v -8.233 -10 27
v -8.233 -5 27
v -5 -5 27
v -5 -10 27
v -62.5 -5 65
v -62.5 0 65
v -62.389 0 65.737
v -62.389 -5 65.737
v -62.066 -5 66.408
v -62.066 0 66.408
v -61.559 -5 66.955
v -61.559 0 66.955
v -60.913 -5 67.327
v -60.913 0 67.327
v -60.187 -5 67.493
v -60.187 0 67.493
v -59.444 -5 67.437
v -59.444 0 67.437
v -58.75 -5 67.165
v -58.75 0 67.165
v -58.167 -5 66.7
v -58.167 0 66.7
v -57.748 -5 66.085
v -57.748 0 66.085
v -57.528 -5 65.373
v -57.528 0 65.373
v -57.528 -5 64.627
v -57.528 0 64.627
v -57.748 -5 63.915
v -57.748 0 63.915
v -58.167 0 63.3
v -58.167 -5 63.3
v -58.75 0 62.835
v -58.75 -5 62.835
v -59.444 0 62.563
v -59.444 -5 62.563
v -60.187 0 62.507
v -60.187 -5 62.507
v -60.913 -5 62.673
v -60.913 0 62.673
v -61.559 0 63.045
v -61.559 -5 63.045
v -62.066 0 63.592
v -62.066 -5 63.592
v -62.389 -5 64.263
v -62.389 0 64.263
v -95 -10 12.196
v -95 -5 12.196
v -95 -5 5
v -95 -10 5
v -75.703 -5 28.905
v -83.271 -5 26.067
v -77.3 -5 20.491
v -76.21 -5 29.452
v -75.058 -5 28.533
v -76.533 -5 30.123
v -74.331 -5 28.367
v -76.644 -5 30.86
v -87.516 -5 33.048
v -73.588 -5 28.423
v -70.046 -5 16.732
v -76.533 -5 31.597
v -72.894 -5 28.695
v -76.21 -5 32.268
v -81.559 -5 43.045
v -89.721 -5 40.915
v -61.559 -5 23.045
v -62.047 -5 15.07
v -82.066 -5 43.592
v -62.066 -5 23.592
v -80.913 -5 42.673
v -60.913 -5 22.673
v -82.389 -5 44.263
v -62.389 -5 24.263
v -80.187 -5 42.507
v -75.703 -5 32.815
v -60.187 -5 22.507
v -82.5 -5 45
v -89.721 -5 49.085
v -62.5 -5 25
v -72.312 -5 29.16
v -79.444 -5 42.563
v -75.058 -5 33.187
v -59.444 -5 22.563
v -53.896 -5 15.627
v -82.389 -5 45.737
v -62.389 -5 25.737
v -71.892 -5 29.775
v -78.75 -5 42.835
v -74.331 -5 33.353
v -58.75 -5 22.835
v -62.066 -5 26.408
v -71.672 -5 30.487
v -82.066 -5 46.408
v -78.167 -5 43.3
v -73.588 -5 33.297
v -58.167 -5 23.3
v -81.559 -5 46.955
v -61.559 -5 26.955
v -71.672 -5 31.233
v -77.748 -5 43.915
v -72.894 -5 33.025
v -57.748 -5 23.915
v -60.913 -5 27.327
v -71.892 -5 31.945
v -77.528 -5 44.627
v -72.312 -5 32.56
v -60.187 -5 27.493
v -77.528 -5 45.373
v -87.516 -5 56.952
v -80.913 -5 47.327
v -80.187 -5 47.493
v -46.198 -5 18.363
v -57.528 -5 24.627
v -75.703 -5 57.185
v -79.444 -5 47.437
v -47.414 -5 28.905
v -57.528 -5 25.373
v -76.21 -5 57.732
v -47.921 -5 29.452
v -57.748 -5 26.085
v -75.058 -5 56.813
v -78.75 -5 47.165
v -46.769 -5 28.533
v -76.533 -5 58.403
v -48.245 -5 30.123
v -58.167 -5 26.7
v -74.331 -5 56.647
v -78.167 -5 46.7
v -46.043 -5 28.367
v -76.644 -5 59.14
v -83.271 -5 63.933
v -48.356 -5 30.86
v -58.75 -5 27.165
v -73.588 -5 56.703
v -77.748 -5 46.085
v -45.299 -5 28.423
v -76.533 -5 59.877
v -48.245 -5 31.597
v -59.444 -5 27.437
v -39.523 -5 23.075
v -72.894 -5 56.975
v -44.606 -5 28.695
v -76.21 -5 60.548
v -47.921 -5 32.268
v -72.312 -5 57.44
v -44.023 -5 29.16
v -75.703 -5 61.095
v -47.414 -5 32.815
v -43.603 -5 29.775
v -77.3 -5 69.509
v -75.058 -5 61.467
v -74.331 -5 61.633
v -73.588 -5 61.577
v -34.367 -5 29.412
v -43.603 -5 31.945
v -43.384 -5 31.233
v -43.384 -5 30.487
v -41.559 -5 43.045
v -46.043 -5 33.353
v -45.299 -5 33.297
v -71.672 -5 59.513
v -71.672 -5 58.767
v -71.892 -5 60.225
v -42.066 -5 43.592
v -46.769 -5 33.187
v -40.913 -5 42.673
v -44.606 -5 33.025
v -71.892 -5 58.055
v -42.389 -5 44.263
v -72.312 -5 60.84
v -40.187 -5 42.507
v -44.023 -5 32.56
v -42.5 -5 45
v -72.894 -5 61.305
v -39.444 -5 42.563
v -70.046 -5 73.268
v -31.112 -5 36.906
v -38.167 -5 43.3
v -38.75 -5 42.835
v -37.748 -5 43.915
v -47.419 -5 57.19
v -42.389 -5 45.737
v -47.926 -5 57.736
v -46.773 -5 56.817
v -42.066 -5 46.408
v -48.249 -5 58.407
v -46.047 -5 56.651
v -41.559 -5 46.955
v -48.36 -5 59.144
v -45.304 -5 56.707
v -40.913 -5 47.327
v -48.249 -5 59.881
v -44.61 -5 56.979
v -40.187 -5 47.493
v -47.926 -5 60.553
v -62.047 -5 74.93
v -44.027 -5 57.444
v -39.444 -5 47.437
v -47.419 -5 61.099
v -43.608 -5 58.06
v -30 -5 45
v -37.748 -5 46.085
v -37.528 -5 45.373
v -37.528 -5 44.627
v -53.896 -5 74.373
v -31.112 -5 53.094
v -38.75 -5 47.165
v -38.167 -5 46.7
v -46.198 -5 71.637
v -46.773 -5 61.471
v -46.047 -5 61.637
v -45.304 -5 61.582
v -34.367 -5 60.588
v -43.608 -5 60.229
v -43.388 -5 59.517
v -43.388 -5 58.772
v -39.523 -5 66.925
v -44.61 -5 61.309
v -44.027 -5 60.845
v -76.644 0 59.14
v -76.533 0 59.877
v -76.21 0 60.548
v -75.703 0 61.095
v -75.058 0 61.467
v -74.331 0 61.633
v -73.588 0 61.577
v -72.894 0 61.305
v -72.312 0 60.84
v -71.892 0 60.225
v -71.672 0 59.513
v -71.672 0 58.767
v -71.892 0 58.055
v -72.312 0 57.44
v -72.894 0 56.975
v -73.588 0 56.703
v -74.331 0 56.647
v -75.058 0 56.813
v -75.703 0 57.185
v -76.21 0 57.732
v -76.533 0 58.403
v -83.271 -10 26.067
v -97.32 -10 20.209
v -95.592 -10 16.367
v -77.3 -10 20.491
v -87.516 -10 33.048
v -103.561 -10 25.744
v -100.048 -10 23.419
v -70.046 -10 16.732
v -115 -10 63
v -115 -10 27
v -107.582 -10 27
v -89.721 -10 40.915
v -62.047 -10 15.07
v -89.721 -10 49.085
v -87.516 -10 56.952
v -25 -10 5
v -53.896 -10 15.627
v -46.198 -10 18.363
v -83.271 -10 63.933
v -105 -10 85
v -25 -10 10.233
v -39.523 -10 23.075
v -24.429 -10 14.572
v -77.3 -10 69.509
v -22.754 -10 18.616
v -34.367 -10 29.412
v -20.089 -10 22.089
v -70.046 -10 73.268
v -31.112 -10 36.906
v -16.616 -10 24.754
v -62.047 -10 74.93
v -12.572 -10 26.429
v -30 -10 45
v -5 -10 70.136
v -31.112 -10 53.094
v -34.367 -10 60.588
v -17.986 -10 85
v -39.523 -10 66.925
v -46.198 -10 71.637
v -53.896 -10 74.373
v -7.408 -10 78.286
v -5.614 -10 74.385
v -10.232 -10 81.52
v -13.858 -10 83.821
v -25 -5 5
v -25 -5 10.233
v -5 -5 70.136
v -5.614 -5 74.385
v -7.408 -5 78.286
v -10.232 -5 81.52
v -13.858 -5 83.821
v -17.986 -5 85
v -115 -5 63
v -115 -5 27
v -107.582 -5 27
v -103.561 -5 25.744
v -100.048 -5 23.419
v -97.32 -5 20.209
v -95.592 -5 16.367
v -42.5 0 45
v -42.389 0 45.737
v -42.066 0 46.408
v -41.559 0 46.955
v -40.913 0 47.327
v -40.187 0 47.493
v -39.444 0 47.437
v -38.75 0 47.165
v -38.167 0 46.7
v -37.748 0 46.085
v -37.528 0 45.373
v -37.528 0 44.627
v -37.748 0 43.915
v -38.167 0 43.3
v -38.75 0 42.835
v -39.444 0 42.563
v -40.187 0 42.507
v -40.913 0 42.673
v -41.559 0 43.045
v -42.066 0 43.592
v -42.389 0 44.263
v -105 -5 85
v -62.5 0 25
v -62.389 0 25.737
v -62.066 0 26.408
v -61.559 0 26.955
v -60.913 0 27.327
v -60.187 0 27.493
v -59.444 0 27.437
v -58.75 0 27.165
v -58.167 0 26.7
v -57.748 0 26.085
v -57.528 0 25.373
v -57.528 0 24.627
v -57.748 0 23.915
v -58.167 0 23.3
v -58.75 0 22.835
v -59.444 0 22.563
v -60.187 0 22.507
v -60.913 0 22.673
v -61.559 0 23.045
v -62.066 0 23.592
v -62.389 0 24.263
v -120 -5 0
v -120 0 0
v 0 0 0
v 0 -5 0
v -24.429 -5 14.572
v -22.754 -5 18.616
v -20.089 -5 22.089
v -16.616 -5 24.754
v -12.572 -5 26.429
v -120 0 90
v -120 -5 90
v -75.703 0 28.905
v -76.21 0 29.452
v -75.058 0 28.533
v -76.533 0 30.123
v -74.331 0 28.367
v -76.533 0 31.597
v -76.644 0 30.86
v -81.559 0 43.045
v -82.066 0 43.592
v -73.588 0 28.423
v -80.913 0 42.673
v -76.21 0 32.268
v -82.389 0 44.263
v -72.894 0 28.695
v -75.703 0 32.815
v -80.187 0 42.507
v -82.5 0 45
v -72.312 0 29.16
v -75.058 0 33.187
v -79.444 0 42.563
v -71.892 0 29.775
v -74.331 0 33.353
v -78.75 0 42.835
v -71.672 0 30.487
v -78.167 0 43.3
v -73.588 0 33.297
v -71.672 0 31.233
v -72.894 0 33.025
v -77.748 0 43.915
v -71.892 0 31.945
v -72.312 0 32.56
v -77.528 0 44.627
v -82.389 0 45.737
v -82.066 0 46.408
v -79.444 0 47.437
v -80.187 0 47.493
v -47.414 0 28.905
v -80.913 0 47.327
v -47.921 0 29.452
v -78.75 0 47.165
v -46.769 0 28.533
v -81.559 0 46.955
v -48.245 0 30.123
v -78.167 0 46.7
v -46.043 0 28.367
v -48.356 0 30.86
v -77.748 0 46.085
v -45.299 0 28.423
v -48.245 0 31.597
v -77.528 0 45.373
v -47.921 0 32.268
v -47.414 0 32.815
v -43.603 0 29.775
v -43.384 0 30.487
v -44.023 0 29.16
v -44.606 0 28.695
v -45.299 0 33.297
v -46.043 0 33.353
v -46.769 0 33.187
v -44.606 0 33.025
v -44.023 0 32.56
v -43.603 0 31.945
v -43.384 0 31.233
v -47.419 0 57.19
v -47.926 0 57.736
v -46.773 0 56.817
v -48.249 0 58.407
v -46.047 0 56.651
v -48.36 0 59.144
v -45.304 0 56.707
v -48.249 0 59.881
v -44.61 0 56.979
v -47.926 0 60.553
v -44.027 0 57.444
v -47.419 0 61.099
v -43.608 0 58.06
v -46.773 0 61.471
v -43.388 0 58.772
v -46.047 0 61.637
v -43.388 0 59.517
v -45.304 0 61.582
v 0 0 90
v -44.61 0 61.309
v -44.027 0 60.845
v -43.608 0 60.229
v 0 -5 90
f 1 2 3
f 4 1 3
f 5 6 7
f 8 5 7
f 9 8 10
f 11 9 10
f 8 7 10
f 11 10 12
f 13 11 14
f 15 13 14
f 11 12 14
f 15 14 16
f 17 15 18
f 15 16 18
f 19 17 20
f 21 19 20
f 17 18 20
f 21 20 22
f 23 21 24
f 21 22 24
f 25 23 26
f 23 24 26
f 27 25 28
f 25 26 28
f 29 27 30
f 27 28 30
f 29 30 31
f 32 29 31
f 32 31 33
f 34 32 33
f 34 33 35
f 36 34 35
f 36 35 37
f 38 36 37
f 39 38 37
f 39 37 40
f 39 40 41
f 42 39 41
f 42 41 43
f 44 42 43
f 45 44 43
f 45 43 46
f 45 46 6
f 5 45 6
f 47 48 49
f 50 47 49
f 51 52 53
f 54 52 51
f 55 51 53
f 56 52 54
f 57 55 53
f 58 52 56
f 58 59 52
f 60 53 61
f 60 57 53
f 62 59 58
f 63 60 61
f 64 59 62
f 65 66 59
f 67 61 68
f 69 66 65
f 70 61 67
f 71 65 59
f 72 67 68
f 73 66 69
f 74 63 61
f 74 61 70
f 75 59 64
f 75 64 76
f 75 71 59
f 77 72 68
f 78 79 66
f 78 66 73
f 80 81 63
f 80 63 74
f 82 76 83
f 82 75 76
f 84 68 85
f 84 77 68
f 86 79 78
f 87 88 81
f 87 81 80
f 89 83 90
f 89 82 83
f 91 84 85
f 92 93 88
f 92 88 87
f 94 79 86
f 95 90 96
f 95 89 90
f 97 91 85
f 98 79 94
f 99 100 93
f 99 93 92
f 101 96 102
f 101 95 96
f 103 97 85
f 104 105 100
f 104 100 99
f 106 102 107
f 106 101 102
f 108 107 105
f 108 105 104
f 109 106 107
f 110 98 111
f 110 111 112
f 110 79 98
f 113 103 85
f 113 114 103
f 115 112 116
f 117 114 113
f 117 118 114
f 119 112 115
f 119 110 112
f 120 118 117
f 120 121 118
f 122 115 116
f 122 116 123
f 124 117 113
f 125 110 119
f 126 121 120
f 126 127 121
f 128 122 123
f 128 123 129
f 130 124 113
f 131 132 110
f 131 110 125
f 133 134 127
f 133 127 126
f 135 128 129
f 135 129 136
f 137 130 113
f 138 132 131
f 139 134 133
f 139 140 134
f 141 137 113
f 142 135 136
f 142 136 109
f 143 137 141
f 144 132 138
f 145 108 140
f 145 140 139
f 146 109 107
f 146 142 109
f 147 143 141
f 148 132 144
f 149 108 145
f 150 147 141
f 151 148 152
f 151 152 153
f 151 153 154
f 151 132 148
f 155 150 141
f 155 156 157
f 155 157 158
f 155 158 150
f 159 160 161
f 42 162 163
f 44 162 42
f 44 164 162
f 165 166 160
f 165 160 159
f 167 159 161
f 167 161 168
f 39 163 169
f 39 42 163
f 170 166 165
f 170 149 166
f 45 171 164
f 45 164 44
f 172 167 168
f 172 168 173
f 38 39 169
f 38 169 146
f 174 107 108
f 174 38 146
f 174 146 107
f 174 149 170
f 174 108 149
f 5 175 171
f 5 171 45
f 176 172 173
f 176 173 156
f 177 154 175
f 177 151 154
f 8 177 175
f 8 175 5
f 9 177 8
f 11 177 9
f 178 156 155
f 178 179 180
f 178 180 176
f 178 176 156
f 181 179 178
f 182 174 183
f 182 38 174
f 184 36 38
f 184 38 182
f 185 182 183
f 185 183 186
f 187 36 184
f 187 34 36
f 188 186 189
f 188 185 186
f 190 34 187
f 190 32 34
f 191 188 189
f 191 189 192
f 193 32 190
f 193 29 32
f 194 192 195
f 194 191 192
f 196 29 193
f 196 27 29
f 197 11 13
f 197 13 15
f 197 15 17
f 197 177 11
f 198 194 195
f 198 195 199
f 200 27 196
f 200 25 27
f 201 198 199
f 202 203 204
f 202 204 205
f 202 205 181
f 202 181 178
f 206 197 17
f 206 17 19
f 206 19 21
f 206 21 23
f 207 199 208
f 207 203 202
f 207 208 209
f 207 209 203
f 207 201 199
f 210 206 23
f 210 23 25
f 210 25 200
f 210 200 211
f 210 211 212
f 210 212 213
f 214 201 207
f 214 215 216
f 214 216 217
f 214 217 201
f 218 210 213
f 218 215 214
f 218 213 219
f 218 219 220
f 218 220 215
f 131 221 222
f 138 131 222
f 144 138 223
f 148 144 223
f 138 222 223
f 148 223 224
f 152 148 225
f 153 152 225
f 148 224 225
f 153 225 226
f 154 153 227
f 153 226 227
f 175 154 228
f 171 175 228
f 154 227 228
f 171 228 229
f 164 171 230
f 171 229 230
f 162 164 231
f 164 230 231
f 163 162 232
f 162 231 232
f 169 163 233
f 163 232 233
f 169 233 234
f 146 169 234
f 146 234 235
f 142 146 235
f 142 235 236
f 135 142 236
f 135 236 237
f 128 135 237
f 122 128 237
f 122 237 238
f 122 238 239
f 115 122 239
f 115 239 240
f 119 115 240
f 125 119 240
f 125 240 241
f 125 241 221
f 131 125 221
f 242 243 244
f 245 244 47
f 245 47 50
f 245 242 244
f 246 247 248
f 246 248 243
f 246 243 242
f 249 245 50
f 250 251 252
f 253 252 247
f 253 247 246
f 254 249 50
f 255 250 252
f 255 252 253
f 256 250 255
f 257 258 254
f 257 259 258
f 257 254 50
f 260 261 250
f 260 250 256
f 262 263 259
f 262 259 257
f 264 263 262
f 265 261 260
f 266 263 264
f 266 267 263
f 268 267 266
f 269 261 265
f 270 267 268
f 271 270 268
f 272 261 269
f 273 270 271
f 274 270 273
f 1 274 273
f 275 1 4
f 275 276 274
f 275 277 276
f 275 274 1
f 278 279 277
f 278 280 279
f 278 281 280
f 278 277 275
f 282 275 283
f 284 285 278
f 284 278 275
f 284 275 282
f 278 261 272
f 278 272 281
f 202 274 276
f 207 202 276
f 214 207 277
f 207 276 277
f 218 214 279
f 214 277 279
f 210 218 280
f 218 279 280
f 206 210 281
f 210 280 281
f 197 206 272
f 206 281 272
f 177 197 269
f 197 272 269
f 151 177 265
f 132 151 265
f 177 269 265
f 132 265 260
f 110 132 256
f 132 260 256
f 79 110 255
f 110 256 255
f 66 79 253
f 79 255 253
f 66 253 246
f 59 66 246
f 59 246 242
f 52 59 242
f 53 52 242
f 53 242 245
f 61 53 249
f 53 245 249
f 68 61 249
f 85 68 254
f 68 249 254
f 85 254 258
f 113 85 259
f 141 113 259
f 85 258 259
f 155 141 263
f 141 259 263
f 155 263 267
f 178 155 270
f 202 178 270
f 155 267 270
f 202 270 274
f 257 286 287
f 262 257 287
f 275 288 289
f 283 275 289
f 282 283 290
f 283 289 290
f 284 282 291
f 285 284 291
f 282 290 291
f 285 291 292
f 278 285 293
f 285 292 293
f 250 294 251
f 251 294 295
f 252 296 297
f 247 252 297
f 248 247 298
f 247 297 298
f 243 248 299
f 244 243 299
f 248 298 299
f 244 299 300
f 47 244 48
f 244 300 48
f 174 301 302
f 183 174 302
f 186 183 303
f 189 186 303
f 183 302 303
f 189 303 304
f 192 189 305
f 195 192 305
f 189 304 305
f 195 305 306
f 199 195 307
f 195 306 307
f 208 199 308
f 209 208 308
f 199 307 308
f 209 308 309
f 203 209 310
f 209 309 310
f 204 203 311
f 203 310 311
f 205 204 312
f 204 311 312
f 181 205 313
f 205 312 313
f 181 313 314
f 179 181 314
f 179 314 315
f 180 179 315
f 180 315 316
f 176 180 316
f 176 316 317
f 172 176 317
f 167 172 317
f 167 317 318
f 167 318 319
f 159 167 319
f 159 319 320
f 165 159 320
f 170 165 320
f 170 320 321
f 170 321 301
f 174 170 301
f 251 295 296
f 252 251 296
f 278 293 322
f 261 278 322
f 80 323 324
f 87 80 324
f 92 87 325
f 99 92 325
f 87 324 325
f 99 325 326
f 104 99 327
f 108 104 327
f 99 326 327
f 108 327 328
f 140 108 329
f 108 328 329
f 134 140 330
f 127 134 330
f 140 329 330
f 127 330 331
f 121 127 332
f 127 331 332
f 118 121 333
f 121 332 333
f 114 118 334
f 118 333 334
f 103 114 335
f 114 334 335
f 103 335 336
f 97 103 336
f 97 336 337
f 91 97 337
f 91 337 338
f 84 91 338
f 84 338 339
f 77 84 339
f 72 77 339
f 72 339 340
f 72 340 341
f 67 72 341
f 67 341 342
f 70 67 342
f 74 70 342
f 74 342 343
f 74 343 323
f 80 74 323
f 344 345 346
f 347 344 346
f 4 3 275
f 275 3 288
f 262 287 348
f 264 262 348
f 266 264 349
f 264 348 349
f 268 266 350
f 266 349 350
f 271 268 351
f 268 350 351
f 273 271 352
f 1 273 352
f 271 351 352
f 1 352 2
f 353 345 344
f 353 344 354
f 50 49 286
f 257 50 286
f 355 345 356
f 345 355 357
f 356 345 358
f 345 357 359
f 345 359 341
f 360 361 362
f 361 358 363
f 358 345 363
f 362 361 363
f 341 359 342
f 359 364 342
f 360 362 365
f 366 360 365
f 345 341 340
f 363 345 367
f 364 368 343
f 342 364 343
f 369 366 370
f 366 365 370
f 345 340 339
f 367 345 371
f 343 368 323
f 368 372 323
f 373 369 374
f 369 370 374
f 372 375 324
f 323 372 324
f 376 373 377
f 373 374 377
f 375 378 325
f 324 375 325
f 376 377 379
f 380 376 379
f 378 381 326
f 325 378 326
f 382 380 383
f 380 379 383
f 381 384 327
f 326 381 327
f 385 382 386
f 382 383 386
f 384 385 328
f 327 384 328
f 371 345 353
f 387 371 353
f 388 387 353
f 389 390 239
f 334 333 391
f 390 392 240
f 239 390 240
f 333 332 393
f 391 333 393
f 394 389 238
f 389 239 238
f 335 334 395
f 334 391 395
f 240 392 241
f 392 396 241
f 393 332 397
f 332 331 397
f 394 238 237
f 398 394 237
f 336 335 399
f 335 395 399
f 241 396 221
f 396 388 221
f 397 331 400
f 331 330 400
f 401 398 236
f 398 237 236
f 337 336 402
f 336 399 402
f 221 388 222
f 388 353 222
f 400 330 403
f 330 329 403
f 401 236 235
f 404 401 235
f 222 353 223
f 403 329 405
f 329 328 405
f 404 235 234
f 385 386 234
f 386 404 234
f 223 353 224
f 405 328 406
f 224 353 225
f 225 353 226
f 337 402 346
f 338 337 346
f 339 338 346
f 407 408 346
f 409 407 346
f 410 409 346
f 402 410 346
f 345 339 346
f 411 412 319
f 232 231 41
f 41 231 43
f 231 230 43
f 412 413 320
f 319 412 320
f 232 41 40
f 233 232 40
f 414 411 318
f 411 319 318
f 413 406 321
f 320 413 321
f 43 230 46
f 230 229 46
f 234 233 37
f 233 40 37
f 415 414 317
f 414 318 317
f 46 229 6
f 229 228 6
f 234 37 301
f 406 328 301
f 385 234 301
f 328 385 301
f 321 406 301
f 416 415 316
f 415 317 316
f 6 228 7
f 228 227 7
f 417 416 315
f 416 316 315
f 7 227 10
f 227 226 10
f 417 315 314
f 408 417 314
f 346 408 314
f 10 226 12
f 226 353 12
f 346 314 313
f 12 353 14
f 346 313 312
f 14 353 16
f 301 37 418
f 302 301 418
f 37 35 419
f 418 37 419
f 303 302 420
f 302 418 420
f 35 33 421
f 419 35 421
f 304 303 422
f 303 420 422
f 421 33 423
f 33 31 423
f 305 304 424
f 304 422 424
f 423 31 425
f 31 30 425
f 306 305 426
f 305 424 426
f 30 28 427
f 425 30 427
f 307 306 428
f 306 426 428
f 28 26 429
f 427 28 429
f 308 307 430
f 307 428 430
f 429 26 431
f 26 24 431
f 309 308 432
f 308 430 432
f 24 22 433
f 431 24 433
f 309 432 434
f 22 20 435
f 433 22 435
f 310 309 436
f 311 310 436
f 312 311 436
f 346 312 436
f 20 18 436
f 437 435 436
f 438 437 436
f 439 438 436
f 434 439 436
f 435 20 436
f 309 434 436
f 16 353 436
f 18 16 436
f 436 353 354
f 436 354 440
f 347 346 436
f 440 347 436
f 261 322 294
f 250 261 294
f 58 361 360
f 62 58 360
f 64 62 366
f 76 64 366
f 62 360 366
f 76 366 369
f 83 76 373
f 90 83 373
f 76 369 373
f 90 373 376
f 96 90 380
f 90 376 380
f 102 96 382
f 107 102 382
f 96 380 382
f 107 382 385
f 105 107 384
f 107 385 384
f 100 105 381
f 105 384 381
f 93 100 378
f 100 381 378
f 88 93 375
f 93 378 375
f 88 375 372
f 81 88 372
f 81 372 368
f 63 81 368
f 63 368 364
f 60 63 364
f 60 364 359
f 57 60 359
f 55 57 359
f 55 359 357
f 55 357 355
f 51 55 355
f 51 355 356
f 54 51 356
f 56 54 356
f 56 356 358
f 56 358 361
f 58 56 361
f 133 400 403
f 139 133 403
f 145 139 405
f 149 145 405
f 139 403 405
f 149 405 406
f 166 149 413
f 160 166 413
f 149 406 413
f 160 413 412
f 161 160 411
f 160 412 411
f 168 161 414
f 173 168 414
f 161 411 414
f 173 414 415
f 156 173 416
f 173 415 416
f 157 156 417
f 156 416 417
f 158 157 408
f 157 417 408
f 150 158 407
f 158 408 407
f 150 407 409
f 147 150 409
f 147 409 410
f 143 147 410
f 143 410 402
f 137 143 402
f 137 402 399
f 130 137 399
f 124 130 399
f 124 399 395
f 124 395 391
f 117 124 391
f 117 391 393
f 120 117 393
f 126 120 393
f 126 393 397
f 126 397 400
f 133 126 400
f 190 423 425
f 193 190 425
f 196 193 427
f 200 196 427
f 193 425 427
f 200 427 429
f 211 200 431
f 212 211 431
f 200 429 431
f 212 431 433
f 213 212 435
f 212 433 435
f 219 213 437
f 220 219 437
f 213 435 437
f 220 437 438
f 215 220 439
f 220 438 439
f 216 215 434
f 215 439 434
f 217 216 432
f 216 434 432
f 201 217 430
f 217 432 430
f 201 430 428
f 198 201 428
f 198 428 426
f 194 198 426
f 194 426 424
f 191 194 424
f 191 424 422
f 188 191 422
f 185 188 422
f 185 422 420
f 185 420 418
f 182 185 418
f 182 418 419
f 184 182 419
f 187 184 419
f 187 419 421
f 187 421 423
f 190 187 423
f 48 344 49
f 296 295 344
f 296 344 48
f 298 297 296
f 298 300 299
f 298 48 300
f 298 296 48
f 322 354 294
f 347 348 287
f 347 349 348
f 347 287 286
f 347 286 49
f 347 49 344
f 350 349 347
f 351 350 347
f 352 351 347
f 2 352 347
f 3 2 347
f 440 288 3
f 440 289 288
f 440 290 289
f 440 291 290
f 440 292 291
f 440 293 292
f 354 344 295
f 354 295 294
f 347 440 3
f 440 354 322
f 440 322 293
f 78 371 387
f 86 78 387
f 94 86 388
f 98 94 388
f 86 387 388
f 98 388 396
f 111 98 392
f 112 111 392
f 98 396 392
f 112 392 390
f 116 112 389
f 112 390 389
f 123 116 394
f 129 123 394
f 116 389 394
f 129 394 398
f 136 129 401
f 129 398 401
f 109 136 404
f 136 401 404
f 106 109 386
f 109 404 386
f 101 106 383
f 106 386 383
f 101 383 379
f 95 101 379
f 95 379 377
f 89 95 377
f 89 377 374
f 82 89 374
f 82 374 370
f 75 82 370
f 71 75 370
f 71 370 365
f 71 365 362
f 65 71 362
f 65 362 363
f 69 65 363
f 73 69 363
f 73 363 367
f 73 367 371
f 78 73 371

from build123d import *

# Parameters (mm, degrees)
F0_W     = 120
F0_H     = 90
F1_DEPTH = 5
F3_D     = 5
F4_R     = 2.5
F5_DEPTH = 5
F6_R     = 30
F7_DEPTH = 5


with BuildPart() as f1:
    # F0 (on Front) → F1 (new body)
    with BuildSketch(Plane.XZ):
        with Locations((-60, 45)):
            Rectangle(F0_W, F0_H)
    extrude(amount=F1_DEPTH)

    # F3 (through all)
    with Locations(Plane.XZ.offset(5)):
        with Locations((-74.144270925, 59.14), (-60, 65), (-45.86, 59.144270925), (-40, 45), (-45.855729075, 30.86), (-60, 25), (-80, 45), (-74.144270925, 30.86)):
            Hole(F3_D / 2)

    # F4 (on face) → F5 (join)
    with BuildSketch(Plane.XZ.offset(5)):
        with BuildLine():
            Line((-5, 27), (-5, 70.1358293132))
            ThreePointArc((-5, 70.1358293132), (-8.7037424203, 80.0046977738), (-17.985941959, 85))
            Line((-17.985941959, 85), (-105, 85))
            Line((-105, 85), (-115, 63))
            Line((-115, 63), (-115, 27))
            Line((-115, 27), (-107.5818091631, 27))
            ThreePointArc((-107.5818091631, 27), (-98.5703704663, 21.9102960199), (-95, 12.1962047746))
            Line((-95, 12.1962047746), (-95, 5))
            Line((-95, 5), (-25, 5))
            Line((-25, 5), (-25, 10.2326651871))
            ThreePointArc((-25, 10.2326651871), (-20.0889613357, 22.0889613357), (-8.2326651871, 27))
            Line((-8.2326651871, 27), (-5, 27))
        make_face()
        with Locations((-74.144270925, 30.86)):
            Circle(F4_R, mode=Mode.SUBTRACT)
        with Locations((-60, 25)):
            Circle(F4_R, mode=Mode.SUBTRACT)
        with Locations((-45.855729075, 30.86)):
            Circle(F4_R, mode=Mode.SUBTRACT)
        with Locations((-80, 45)):
            Circle(F4_R, mode=Mode.SUBTRACT)
        with Locations((-74.144270925, 59.14)):
            Circle(F4_R, mode=Mode.SUBTRACT)
        with Locations((-40, 45)):
            Circle(F4_R, mode=Mode.SUBTRACT)
        with Locations((-45.86, 59.144270925)):
            Circle(F4_R, mode=Mode.SUBTRACT)
        with Locations((-60, 65)):
            Circle(F4_R, mode=Mode.SUBTRACT)
    extrude(amount=F5_DEPTH)

    # F6 (on face) → F7 (cut)
    with BuildSketch(Plane.XZ.offset(10)):
        with Locations((-60, 45)):
            Circle(F6_R)
    extrude(amount=-F7_DEPTH, mode=Mode.SUBTRACT)


solid = f1.part
